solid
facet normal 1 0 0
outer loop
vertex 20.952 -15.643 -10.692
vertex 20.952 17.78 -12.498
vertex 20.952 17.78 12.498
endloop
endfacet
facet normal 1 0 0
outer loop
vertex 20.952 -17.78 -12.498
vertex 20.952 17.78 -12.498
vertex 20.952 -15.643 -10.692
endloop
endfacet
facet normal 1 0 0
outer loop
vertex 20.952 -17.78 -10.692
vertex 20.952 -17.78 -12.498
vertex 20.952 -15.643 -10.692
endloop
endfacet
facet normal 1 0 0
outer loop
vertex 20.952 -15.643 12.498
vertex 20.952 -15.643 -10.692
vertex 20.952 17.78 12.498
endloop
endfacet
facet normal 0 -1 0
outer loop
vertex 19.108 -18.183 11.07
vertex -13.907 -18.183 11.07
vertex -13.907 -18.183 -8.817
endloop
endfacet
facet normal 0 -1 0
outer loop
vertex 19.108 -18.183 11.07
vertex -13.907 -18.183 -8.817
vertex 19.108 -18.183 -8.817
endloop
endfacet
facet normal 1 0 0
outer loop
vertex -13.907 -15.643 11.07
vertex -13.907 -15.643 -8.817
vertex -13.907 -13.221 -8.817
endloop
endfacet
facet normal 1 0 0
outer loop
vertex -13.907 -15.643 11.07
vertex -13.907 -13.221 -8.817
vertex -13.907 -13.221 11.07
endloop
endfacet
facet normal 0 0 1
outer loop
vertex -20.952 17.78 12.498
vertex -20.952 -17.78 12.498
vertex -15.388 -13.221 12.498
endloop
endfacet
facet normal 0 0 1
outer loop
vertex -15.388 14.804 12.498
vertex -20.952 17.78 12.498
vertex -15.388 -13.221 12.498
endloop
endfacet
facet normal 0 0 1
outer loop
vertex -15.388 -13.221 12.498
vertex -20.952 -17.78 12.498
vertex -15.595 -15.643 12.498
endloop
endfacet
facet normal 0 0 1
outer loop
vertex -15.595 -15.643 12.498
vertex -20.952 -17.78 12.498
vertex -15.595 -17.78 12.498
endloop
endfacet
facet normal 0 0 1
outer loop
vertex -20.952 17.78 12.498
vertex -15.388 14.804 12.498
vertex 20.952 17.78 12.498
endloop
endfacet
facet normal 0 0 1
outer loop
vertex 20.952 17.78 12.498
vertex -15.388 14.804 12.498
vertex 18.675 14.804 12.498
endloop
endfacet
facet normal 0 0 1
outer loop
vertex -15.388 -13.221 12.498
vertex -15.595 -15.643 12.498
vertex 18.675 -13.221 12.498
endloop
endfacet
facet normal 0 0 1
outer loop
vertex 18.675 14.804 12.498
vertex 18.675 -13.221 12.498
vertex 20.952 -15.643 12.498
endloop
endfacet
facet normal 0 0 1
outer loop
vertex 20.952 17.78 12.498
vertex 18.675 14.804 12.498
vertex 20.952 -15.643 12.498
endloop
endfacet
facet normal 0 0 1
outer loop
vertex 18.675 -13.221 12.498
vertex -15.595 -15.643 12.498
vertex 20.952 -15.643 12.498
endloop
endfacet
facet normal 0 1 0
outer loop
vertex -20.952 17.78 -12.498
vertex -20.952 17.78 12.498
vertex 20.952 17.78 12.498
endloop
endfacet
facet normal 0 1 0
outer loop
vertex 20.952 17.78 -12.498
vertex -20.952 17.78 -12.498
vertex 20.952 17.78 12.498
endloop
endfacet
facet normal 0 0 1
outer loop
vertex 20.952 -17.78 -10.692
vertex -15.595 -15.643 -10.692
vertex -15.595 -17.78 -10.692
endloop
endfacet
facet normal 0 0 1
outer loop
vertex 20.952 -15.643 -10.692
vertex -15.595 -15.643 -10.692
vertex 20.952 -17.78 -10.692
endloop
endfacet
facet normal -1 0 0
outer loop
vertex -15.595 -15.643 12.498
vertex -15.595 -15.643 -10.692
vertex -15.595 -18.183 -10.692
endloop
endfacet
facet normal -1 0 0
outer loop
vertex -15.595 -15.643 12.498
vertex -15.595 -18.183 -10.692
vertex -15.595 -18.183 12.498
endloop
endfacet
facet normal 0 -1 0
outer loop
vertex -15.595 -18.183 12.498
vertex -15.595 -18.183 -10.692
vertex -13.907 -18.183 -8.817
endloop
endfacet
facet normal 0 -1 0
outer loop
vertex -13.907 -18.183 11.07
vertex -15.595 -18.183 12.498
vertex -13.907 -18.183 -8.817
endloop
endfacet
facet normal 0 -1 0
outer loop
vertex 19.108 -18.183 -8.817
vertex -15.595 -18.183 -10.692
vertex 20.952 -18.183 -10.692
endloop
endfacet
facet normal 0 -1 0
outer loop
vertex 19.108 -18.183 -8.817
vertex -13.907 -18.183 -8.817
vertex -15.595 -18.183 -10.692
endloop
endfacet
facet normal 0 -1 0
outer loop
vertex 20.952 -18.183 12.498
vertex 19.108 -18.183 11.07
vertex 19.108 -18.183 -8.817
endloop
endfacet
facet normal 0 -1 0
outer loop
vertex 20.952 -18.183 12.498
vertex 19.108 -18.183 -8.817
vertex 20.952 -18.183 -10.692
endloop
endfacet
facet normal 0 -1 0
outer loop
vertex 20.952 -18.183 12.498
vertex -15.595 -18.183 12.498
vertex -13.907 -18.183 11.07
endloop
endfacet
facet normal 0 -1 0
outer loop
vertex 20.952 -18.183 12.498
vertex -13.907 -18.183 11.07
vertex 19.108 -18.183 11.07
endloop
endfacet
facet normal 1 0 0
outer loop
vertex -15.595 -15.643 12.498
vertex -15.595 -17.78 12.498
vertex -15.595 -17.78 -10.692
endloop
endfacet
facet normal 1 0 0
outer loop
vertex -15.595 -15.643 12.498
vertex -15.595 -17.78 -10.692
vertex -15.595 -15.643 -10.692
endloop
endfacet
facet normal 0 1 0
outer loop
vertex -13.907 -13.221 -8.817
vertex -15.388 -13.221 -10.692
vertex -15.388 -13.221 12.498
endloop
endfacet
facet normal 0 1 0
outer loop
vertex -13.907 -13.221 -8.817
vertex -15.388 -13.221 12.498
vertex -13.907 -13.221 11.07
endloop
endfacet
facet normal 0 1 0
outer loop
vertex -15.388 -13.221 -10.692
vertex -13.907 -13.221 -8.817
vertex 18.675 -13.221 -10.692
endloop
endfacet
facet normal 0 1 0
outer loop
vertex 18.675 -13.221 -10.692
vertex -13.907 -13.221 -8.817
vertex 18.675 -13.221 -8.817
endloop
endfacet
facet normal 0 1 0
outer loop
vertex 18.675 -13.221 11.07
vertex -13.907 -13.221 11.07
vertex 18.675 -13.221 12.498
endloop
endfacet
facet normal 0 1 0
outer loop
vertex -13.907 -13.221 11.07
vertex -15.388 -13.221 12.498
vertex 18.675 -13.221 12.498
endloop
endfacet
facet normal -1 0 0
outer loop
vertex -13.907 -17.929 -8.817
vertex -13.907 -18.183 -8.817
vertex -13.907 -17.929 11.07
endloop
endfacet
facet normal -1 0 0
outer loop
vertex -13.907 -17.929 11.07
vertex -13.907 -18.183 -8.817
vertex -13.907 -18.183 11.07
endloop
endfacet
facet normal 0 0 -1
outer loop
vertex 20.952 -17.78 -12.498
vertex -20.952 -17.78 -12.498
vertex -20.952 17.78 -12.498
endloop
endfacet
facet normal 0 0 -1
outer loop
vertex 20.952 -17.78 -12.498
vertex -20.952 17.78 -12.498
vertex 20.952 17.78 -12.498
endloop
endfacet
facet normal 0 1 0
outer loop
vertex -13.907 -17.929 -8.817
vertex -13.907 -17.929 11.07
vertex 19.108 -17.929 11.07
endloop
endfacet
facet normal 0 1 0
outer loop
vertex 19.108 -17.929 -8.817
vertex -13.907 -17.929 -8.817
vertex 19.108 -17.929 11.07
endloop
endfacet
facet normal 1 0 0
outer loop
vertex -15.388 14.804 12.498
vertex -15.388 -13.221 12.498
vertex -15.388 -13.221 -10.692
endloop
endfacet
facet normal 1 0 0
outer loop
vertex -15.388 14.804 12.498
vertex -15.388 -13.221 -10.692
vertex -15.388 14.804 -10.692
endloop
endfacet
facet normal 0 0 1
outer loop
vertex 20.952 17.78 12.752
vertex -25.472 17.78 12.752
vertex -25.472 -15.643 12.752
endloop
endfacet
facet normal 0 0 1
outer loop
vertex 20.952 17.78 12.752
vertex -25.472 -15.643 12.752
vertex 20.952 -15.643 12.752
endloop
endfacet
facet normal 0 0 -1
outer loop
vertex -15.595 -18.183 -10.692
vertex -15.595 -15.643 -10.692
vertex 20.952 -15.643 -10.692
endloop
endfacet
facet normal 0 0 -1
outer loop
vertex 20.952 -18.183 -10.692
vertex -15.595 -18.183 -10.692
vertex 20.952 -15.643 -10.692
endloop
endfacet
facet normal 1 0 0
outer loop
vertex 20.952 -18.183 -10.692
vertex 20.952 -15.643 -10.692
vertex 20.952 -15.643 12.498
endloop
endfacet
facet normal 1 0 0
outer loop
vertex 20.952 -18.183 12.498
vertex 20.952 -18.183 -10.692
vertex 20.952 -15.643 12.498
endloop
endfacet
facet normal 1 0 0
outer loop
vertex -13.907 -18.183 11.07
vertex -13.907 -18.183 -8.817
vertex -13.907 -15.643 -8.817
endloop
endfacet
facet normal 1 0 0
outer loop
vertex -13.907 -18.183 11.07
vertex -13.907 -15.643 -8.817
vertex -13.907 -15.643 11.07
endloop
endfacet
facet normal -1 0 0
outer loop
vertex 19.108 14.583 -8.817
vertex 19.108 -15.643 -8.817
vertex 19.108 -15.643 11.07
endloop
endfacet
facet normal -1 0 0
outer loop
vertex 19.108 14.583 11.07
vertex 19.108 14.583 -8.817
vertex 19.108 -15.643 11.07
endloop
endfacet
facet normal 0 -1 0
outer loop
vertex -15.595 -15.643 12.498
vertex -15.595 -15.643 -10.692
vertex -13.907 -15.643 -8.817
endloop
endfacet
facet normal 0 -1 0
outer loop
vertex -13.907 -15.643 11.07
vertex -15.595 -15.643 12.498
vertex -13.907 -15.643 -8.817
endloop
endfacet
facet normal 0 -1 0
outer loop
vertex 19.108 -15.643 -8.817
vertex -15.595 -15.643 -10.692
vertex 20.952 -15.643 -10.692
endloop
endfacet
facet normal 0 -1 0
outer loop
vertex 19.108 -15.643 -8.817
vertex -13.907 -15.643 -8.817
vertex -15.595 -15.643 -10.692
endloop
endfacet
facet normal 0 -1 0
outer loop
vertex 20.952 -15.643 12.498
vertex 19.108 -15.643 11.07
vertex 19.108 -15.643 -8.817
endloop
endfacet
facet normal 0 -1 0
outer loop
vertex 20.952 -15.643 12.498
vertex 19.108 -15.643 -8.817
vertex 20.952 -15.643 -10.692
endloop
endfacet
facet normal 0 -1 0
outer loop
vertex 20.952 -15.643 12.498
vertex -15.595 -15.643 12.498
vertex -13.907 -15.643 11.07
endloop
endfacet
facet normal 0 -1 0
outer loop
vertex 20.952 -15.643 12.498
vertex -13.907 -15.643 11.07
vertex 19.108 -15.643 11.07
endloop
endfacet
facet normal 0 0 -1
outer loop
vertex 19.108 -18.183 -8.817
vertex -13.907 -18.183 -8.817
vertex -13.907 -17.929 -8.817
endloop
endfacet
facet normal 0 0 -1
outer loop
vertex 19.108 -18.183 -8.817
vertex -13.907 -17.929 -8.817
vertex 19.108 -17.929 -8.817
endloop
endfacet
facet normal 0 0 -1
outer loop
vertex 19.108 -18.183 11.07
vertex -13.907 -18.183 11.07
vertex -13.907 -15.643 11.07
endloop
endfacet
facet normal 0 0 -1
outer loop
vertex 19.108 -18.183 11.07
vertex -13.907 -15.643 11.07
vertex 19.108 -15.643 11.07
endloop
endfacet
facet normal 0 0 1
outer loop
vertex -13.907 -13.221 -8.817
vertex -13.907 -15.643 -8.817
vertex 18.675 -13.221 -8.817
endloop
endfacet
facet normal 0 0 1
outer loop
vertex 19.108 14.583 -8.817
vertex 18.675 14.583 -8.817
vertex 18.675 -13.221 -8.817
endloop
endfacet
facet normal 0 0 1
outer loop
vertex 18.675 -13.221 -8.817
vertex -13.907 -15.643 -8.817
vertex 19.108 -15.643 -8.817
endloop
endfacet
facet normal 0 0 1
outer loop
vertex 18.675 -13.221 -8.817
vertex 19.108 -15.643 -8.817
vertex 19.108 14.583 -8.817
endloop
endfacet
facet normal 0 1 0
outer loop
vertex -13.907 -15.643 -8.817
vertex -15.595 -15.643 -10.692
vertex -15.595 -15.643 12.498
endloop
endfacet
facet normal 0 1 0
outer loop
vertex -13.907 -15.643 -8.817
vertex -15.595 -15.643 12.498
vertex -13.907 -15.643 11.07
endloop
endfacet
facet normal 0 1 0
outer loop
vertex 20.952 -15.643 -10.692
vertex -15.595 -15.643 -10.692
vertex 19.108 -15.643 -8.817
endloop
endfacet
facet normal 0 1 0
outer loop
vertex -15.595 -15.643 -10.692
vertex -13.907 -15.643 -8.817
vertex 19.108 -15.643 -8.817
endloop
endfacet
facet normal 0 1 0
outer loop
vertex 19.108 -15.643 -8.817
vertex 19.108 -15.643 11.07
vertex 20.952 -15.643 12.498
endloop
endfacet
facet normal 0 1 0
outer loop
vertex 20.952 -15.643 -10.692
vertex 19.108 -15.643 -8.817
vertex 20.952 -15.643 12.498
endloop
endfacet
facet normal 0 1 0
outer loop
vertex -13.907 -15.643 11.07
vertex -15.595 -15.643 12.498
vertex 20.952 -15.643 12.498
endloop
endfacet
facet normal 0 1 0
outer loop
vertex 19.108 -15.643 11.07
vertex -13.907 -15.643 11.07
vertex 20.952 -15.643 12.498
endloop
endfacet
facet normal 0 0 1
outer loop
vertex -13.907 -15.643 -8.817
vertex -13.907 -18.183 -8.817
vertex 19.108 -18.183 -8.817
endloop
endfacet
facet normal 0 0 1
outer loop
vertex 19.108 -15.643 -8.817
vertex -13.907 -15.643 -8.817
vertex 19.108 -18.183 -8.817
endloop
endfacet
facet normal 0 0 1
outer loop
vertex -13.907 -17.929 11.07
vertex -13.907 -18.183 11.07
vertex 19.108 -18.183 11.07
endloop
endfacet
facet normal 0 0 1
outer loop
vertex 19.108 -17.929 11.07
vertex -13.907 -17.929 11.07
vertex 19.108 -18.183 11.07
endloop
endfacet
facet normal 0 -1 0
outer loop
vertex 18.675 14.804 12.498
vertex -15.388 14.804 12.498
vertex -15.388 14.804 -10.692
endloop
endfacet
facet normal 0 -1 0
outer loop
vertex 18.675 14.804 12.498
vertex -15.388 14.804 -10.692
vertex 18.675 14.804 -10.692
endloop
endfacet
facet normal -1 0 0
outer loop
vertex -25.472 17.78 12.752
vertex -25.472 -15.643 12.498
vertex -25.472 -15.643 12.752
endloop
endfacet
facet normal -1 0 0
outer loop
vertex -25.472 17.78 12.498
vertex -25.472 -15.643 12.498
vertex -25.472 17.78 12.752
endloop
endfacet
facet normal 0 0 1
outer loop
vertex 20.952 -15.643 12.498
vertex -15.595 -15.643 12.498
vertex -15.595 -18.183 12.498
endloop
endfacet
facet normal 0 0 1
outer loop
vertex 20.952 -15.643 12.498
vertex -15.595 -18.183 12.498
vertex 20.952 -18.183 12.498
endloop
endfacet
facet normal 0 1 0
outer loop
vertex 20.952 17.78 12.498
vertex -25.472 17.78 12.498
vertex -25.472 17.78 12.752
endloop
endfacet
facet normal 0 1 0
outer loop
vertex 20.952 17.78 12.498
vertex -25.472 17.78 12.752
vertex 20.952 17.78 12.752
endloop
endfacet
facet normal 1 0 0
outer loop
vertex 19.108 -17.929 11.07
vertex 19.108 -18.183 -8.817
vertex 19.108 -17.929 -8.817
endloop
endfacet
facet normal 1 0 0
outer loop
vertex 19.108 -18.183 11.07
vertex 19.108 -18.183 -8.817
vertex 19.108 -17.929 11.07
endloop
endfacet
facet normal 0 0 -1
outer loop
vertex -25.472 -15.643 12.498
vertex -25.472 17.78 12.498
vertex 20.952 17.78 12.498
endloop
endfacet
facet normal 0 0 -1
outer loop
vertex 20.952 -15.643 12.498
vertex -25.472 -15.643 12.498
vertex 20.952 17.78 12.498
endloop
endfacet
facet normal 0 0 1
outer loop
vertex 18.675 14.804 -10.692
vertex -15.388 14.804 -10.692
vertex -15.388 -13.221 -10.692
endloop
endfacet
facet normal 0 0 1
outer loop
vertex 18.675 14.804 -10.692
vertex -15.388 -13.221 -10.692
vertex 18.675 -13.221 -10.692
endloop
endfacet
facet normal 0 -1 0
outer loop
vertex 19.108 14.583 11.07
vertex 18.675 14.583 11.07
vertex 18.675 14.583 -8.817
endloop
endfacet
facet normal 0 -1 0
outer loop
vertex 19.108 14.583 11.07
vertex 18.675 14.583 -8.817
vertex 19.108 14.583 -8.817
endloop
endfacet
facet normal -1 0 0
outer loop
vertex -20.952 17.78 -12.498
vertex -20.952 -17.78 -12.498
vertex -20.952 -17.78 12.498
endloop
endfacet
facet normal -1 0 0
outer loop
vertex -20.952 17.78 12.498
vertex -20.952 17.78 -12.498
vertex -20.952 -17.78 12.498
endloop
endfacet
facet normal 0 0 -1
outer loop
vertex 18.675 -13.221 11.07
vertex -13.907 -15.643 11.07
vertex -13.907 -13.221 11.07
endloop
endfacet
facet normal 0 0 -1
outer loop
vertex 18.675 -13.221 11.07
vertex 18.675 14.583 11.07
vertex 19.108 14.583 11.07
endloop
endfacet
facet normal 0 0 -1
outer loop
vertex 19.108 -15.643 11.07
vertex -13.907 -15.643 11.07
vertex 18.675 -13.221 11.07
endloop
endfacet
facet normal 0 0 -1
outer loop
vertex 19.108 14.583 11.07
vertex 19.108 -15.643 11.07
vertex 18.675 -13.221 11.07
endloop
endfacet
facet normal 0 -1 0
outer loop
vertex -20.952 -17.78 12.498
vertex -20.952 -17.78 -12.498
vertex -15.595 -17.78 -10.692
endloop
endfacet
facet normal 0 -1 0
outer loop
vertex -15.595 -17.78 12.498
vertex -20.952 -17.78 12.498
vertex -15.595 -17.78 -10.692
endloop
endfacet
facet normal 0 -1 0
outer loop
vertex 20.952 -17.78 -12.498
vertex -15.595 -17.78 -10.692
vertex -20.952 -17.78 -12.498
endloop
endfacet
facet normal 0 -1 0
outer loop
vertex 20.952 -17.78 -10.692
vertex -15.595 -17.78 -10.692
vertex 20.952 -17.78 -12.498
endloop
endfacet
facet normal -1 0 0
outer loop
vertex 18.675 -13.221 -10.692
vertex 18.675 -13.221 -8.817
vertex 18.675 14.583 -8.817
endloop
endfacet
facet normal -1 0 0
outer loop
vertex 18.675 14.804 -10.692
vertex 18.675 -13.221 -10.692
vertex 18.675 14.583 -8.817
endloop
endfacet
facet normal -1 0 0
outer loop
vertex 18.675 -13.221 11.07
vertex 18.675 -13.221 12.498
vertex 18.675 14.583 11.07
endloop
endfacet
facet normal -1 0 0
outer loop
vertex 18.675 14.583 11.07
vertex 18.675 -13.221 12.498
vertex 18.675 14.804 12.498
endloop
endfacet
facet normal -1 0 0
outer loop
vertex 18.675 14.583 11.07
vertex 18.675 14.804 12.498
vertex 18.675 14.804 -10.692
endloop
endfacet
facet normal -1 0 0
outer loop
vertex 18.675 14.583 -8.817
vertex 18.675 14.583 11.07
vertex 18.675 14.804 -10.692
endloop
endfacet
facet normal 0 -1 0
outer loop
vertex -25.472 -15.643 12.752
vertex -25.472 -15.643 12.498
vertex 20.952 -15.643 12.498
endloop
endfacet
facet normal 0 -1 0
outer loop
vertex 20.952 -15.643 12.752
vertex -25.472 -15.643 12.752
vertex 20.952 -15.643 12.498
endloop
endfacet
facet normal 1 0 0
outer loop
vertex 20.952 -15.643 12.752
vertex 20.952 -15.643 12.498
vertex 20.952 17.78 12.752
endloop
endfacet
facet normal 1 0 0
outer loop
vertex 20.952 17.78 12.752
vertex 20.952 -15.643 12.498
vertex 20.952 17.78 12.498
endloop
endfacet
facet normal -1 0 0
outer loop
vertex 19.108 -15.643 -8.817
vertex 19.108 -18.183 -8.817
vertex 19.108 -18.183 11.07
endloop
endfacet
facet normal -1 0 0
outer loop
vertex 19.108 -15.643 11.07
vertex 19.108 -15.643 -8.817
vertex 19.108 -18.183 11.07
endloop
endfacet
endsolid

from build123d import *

# Parameters (mm, degrees)
F0_W          = 41.904162
F0_H          = 24.995466
F1_DEPTH      = 17.78
F1_DEPTH_BACK = 17.78
F2_W          = 36.547231
F2_H          = 2.137129
F3_DEPTH      = 23.1902
F4_W          = 36.547231
F4_H          = 23.1902
F5_DEPTH      = 2.54
F6_W          = 33.0145
F6_H          = 19.887494
F7_DEPTH      = 32.766
F8_W          = 33.0145
F8_H          = 19.887494
F9_DEPTH      = 0.254
F10_W         = 34.06269
F10_H         = 28.0248
F11_DEPTH     = 23.1902
F12_W         = 46.423603
F12_H         = 33.422871
F13_DEPTH     = 0.254


with BuildPart() as f1:
    # F0 (on Front) → F1 (new body, two sides)
    with BuildSketch(Plane.XZ) as f1_sk:
        Rectangle(F0_W, F0_H)
    extrude(amount=F1_DEPTH)
    extrude(f1_sk.sketch, amount=-F1_DEPTH_BACK)

    # F2 (on face) → F3 (cut)
    with BuildSketch(Plane.XY.offset(12.497733)):
        with Locations((2.678466, -16.711436)):
            Rectangle(F2_W, F2_H)
    extrude(amount=-F3_DEPTH, mode=Mode.SUBTRACT)


with BuildPart() as f5:
    # F4 (on face) → F5 (new body)
    with BuildSketch(Plane.XZ.offset(15.642871)):
        with Locations((2.678466, 0.902633)):
            Rectangle(F4_W, F4_H)
    extrude(amount=F5_DEPTH)


with BuildPart() as f7_tool:
    # F6 (on face) → F7 (new body)
    with BuildSketch(Plane.XZ.offset(18.182871)):
        with Locations((2.60063, 1.126369)):
            Rectangle(F6_W, F6_H)
    extrude(amount=-F7_DEPTH)


with BuildPart() as f1_1:
    add(f1.part)

    # F7: cut by f7_tool
    add(f7_tool.part, mode=Mode.SUBTRACT)

    # F10 (on face) → F11 (cut)
    with BuildSketch(Plane.XY.offset(12.497733)):
        with Locations((1.643826, 0.791443)):
            Rectangle(F10_W, F10_H)
    extrude(amount=-F11_DEPTH, mode=Mode.SUBTRACT)


with BuildPart() as f5_1:
    add(f5.part)

    # F7: cut by f7_tool
    add(f7_tool.part, mode=Mode.SUBTRACT)


with BuildPart() as f9:
    # F8 (on face) → F9 (new body)
    with BuildSketch(Plane.XZ.offset(18.182871)):
        with Locations((2.60063, 1.126369)):
            Rectangle(F8_W, F8_H)
    extrude(amount=-F9_DEPTH)


with BuildPart() as f13:
    # F12 (on face) → F13 (new body)
    with BuildSketch(Plane.XY.offset(12.497733)):
        with Locations((-2.259721, 1.068564)):
            Rectangle(F12_W, F12_H)
    extrude(amount=F13_DEPTH)


solid = Compound([f1_1.part, f5_1.part, f9.part, f13.part])
